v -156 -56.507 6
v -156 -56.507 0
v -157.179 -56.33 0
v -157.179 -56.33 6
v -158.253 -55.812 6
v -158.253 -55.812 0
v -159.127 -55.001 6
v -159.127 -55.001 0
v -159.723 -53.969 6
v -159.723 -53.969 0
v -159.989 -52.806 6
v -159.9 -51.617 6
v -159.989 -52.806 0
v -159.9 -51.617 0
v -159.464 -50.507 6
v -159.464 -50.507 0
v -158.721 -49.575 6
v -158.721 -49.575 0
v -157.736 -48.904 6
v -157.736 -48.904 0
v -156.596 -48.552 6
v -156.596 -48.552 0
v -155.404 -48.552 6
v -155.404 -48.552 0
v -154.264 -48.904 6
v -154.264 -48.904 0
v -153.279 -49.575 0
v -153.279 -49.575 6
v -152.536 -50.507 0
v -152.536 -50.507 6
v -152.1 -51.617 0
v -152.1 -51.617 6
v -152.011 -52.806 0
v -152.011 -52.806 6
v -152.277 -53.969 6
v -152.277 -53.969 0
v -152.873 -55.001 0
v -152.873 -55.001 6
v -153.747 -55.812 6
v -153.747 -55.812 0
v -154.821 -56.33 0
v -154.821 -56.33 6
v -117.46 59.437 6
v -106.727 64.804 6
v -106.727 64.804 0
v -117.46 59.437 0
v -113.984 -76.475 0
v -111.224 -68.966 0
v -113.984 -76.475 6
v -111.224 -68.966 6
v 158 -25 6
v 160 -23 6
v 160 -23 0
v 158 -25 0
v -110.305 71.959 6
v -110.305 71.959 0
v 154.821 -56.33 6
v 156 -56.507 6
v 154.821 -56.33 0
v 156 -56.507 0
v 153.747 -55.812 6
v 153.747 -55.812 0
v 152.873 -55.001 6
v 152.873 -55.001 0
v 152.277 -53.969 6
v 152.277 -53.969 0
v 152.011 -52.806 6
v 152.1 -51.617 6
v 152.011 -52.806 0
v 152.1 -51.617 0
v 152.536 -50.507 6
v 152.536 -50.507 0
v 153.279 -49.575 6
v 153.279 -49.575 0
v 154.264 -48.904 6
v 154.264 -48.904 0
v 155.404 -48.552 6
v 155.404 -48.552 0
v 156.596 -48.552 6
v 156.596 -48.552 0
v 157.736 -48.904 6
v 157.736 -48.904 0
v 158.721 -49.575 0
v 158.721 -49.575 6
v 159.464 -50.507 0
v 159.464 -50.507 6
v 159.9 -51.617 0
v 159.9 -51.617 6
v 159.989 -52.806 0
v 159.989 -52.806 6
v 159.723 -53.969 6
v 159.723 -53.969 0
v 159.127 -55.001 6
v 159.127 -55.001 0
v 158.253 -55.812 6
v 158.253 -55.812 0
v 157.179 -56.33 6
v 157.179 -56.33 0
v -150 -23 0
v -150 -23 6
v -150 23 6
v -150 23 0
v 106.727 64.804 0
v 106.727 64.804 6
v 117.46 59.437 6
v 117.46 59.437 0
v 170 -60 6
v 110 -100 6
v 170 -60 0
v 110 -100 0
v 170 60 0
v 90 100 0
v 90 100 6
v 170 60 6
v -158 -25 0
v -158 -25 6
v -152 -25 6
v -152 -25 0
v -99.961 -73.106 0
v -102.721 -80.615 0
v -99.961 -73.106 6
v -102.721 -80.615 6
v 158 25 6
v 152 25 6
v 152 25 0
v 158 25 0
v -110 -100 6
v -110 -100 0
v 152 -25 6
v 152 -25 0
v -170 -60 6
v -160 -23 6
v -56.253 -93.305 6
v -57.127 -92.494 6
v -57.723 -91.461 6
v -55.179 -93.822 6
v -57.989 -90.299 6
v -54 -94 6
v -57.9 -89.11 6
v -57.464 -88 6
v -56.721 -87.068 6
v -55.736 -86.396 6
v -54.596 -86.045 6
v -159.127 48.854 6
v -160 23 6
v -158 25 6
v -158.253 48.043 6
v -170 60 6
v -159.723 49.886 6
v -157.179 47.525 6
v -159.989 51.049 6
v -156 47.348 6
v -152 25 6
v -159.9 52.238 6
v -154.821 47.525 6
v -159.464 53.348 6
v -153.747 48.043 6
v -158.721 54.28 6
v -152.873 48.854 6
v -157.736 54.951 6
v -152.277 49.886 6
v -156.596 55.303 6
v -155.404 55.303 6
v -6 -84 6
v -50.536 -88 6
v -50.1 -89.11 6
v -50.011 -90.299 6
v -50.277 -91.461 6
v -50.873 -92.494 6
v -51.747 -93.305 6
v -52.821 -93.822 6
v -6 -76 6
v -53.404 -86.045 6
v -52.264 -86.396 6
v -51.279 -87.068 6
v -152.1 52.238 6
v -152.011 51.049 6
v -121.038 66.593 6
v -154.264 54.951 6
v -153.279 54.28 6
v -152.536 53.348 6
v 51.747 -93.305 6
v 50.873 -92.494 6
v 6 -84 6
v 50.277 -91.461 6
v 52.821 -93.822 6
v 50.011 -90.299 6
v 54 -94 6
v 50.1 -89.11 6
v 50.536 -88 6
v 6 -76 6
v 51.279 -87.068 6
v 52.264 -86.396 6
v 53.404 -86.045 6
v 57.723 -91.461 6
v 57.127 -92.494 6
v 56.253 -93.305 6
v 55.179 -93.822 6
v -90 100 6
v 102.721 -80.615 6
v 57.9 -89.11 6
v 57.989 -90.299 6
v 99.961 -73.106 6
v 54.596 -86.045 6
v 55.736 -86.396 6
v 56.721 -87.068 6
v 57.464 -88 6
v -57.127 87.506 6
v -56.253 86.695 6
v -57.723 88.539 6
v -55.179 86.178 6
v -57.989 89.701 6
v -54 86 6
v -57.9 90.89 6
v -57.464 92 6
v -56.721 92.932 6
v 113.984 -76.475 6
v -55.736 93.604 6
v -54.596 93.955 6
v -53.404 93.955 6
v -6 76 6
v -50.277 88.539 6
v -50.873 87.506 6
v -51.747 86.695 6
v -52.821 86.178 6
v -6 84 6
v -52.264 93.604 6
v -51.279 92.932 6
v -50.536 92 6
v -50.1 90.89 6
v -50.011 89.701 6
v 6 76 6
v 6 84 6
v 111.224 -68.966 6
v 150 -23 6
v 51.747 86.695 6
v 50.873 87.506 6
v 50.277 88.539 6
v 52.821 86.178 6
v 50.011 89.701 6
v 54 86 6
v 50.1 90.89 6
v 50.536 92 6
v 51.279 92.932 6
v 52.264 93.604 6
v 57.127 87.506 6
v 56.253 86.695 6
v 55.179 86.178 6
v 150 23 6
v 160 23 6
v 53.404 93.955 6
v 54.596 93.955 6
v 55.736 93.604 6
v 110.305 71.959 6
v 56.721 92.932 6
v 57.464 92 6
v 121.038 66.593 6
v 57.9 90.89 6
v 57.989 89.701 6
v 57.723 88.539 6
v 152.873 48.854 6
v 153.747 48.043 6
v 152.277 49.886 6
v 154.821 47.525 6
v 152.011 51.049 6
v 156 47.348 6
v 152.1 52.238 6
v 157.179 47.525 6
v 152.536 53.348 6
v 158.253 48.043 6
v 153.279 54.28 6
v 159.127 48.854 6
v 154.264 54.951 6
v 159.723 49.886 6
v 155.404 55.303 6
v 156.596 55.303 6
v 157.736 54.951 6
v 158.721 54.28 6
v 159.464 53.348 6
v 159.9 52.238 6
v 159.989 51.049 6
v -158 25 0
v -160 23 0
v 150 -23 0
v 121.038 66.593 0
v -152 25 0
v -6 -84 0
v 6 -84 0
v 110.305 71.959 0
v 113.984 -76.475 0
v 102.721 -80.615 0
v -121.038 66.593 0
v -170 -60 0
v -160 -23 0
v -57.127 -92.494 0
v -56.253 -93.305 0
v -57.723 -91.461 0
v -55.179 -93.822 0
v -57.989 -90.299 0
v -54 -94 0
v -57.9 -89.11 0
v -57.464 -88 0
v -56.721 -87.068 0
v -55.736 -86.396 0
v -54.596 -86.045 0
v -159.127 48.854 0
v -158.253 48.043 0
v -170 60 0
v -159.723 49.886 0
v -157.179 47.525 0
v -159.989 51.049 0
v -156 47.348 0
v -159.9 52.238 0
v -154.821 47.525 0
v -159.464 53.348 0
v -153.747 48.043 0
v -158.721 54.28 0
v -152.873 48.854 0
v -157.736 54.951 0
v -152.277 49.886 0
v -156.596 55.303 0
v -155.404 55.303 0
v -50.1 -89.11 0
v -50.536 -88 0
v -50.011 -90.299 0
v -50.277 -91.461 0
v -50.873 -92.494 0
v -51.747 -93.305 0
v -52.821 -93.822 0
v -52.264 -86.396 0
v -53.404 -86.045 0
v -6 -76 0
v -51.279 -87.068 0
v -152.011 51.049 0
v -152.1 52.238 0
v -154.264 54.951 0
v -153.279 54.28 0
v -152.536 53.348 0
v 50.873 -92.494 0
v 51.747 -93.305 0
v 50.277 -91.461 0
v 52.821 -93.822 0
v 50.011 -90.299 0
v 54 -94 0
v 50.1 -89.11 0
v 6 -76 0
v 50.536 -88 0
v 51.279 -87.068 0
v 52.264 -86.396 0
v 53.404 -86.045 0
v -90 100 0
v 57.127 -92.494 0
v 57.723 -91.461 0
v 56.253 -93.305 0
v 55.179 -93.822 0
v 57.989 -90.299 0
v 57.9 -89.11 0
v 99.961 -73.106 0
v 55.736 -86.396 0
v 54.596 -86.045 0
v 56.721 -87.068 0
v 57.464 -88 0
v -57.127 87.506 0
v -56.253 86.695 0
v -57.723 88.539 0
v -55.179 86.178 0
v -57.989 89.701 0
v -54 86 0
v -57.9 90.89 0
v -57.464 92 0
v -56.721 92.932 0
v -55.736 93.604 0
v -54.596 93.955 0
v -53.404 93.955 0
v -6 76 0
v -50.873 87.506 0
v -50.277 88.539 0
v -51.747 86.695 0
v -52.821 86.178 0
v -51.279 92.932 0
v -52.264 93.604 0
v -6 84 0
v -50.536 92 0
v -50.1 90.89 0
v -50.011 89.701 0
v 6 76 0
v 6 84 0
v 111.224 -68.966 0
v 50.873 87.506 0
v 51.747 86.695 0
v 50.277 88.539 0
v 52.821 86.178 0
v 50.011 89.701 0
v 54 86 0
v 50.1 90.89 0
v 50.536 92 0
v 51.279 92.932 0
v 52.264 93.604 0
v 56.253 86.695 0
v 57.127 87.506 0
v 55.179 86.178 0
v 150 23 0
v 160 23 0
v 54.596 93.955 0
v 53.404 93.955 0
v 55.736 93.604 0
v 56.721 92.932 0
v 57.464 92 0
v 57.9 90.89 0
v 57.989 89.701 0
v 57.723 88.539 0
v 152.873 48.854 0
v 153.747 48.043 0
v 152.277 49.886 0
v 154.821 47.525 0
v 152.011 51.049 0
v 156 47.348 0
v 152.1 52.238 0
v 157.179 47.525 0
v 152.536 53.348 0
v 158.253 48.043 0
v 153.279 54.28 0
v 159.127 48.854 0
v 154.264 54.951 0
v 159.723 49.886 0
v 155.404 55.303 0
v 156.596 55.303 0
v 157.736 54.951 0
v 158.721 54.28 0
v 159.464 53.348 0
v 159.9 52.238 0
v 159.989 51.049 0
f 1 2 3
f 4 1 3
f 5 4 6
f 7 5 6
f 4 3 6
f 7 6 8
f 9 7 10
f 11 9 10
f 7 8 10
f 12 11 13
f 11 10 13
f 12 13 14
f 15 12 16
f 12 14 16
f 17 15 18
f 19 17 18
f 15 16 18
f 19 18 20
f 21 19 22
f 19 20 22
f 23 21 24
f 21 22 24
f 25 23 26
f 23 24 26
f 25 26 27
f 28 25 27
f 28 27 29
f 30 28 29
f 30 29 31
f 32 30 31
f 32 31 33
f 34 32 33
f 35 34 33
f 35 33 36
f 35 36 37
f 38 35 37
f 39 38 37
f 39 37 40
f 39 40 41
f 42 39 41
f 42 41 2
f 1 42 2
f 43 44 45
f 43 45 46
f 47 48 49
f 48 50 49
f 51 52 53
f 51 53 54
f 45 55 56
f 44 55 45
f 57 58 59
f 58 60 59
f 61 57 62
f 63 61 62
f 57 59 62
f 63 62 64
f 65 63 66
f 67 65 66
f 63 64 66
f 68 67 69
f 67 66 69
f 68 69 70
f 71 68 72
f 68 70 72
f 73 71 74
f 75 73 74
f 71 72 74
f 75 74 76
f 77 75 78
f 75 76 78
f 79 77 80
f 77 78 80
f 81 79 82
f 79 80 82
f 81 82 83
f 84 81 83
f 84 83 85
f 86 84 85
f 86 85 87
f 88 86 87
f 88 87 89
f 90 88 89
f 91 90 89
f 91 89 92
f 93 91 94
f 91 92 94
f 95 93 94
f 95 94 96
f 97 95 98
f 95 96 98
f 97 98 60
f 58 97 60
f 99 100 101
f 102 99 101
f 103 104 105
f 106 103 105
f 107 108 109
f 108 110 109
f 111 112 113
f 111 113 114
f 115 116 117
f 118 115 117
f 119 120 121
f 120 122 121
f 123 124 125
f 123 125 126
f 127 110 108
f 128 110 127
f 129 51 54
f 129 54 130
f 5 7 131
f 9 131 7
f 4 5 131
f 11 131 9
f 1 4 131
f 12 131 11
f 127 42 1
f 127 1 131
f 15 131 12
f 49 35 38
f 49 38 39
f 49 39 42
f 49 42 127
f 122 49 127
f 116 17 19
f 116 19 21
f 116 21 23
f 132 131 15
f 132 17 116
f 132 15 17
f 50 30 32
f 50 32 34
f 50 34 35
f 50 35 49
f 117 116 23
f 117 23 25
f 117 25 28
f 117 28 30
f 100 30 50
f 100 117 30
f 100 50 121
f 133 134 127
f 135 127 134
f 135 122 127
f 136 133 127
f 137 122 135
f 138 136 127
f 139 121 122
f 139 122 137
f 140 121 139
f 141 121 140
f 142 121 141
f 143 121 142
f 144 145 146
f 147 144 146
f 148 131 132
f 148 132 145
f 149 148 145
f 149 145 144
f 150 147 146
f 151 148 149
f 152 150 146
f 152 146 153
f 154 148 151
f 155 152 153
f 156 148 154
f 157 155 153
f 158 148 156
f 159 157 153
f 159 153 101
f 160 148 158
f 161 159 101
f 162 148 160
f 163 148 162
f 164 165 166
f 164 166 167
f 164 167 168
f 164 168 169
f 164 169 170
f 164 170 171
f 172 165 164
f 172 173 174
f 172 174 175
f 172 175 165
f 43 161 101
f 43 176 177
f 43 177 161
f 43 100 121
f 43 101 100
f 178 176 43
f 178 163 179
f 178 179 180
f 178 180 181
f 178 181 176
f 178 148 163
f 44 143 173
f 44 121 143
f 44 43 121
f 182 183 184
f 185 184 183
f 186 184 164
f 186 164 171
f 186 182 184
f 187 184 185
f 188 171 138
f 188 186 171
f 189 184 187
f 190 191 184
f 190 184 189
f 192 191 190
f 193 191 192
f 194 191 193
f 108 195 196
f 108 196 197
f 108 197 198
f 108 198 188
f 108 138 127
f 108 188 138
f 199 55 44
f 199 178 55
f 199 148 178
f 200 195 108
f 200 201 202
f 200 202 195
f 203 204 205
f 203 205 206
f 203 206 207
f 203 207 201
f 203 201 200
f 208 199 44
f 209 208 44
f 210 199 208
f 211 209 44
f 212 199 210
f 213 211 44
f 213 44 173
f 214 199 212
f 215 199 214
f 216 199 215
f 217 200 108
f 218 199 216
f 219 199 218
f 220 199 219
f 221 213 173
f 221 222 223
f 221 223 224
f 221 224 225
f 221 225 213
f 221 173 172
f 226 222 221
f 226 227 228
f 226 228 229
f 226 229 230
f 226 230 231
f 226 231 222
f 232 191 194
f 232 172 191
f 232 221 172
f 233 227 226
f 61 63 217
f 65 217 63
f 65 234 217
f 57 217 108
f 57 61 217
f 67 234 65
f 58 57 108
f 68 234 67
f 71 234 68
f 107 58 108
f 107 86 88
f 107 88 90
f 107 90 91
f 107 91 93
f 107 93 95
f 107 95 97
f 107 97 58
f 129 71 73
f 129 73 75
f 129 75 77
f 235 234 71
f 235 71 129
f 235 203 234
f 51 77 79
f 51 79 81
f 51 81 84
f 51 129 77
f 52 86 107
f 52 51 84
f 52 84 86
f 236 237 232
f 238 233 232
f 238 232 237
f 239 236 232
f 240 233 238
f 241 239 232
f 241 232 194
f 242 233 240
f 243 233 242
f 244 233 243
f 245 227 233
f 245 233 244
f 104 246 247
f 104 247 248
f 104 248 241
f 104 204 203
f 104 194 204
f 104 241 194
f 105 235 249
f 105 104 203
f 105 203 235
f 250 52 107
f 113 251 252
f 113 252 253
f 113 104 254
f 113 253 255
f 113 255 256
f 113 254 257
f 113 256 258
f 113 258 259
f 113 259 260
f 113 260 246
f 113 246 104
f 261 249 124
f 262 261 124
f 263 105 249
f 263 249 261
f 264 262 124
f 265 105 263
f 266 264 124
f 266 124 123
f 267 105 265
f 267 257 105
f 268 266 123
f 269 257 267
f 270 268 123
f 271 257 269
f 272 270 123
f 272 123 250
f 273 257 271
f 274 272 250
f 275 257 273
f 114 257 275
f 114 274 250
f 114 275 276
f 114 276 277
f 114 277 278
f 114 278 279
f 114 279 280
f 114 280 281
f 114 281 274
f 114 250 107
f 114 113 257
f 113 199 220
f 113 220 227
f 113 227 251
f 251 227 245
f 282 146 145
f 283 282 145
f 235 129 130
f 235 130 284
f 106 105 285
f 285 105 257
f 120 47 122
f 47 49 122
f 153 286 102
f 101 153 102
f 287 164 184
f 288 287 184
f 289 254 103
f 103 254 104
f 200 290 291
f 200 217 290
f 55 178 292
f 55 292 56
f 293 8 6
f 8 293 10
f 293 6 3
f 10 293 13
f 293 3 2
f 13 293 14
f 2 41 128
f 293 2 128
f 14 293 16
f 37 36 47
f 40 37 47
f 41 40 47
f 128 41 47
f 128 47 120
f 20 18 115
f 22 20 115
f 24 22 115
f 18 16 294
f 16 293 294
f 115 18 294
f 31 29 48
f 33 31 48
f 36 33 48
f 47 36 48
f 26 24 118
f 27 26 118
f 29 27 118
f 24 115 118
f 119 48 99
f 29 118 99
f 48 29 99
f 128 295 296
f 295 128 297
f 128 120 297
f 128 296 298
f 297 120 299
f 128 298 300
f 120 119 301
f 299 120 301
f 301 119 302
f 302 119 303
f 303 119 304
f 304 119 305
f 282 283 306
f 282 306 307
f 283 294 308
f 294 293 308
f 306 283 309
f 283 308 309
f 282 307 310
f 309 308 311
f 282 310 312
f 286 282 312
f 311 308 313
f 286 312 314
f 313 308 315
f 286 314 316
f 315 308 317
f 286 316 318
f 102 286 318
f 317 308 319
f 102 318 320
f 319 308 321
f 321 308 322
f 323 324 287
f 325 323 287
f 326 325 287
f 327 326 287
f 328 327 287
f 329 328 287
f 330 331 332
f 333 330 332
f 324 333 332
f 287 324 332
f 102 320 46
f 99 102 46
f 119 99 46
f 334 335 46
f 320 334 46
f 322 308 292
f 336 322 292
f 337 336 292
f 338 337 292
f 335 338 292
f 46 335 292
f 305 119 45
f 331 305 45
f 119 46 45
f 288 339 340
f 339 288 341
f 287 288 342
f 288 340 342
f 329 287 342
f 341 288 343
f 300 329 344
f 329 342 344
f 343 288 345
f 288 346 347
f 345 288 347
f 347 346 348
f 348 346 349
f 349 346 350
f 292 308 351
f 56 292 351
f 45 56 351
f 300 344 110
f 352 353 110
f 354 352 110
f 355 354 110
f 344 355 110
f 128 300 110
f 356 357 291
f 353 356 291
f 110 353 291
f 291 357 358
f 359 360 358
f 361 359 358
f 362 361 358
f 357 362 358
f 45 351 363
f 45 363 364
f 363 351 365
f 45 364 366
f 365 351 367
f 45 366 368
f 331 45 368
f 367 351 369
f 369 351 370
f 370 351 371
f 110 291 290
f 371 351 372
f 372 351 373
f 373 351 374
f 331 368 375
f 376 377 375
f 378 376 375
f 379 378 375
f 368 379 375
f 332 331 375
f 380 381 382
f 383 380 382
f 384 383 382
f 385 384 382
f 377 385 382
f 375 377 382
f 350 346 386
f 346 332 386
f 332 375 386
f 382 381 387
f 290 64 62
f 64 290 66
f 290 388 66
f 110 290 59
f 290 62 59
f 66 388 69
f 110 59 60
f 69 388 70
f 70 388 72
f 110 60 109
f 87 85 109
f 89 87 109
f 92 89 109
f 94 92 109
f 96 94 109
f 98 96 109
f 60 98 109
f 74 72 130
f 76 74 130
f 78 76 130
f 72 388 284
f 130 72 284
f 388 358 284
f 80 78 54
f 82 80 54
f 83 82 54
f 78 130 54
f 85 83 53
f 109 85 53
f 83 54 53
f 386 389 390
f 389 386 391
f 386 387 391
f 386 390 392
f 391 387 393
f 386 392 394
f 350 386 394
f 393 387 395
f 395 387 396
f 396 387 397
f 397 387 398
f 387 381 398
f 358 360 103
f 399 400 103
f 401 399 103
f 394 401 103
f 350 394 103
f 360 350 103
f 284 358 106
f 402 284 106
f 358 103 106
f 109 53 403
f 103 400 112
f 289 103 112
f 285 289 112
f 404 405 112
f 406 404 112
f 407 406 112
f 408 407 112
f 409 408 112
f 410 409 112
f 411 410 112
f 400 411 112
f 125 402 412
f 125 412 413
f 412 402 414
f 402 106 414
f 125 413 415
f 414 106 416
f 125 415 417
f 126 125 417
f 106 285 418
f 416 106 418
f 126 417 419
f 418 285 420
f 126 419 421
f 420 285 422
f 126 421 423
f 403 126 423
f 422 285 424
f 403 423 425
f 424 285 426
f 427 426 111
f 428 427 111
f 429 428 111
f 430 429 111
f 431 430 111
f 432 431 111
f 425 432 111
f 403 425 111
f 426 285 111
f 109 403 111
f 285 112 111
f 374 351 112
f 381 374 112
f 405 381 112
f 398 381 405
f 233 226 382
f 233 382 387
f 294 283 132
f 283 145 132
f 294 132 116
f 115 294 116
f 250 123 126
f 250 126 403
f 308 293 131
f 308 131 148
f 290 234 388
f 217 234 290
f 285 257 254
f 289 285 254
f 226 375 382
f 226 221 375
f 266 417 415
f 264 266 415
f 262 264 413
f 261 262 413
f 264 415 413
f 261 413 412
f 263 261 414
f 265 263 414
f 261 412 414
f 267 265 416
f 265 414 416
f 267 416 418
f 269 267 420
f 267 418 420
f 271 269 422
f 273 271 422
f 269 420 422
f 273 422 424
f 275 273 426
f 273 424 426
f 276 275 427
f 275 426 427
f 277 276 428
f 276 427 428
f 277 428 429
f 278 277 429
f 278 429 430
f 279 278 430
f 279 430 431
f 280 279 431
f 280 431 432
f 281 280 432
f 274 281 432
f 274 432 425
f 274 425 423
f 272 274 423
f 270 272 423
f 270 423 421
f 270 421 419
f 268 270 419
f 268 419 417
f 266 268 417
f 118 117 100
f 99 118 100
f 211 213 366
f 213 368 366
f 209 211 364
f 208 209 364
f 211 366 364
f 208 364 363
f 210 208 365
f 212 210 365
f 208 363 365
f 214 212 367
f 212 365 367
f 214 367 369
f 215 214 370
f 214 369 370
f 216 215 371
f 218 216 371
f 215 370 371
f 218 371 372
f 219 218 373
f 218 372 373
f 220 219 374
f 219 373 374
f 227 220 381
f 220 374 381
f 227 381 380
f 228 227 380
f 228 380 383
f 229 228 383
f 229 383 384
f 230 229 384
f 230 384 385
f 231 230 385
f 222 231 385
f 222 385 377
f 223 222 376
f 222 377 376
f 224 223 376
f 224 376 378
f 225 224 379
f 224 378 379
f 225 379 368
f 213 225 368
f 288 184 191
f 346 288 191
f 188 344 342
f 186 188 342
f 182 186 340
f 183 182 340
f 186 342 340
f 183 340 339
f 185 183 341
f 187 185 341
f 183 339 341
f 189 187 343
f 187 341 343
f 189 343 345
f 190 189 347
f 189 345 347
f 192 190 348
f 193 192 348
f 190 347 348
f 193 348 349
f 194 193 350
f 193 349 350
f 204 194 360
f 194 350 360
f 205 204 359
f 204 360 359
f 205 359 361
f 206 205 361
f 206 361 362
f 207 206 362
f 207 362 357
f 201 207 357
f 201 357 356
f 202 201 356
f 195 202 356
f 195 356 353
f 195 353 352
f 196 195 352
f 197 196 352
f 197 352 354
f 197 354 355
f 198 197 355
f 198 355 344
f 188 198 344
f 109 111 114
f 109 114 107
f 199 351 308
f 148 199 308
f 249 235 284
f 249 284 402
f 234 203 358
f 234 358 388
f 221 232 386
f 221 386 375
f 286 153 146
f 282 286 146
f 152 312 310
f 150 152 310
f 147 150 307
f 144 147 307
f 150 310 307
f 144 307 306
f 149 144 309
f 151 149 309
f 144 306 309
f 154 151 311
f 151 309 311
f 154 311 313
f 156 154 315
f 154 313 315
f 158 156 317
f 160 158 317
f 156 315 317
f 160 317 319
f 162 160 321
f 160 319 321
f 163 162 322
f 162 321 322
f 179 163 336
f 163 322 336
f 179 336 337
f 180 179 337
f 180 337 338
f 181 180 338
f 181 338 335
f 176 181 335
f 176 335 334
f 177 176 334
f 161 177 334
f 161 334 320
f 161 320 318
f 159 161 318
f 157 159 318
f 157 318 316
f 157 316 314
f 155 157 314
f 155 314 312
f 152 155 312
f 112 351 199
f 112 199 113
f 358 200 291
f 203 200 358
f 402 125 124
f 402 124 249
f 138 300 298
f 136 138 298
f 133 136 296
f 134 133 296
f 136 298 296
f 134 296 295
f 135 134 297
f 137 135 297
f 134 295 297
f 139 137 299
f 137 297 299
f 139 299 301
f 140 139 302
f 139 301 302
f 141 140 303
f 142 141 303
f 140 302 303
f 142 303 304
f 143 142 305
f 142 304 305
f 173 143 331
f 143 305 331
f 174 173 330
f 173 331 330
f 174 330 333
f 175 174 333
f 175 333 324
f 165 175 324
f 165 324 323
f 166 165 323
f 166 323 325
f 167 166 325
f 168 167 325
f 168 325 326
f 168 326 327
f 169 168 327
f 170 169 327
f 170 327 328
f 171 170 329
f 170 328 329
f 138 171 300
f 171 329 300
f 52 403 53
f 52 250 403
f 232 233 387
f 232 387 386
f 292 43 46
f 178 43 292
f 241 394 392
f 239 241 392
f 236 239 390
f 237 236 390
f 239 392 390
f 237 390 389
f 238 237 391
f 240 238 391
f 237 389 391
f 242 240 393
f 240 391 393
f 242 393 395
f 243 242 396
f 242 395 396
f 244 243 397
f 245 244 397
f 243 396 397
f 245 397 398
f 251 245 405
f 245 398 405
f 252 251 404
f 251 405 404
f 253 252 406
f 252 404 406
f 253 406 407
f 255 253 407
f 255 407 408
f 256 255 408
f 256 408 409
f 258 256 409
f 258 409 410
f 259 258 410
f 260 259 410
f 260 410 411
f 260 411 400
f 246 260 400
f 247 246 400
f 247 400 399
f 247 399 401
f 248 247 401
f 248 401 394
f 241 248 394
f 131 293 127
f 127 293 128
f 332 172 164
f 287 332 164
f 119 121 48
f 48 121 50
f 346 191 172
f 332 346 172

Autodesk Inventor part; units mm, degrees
ref_plane "YZ Plane" through (0, 0, 0) normal (1, 0, 0) x (0, 1, 0)
ref_plane "XZ Plane" through (0, 0, 0) normal (0, 1, 0) x (-1, 0, 0)
ref_plane "XY Plane" through (0, 0, 0) normal (0, 0, 1) x (1, 0, 0)
sketch "Esquisse1" plane through (0, 0, 0) normal (0, 0, 1) x (1, 0, 0)
  line L0 (110, -100) -> (-110, -100)
  line L1 (-170, -60) -> (-170, 60)
  line L2 (170, 60) -> (170, -60)
  line L3 (170, -100) -> (-170, 100) construction
  line L4 (-170, -100) -> (170, 100) construction
  line L5 (-90, 100) -> (-170, 60)
  line L6 (90, 100) -> (170, 60)
  line L7 (-170, -60) -> (-110, -100)
  line L8 (110, -100) -> (170, -60)
  line L9 (-90, 100) -> (90, 100)
  point P0 (0, 0)
  point P1 (0, 0)
  dimension "d0" = 340
  dimension "d1" = 80
  dimension "d2" = 40
  dimension "d3" = 80
  dimension "d4" = 40
  dimension "d5" = 40
  dimension "d6" = 60
  dimension "d7" = 60
  dimension "d8" = 40
  dimension "d17" = 100
extrude "Extrusion1" add sketch "Esquisse1" along normal blind 6
sketch "Esquisse2" plane through (0, 0, 6) normal (0, 0, 1) x (1, 0, 0)
  line L0 (-54, 90) -> (54, 90)
  line L1 (-156, 0) -> (156, 0)
  line L2 (-170, 60) -> (-170, -60)
  line L3 (170, -60) -> (170, 60)
  line L4 (-110, -100) -> (110, -100)
  line L5 (90, 100) -> (-69, 100)
  line L6 (-156, 0) -> (-156, 51.3475)
  line L7 (-156, 0) -> (-156, -52.5074)
  line L8 (156, 0) -> (156, 51.3475)
  line L9 (156, 0) -> (156, -52.5074)
  line L10 (170, 60) -> (90, 100) projected
  line L11 (110, -100) -> (170, -60) projected
  line L12 (-170, -60) -> (-110, -100) projected
  line L13 (-90, 100) -> (-170, 60) projected
  line L14 (90, 100) -> (-90, 100) projected
  point P0 (0, 0)
  point P1 (0, 0)
  point P2 (-54, -90)
  point P3 (54, -90)
  point P4 (0, 0)
  dimension "d21" = 14
  dimension "d22" = 14
  dimension "d23" = 10
  dimension "d24" = 108
  dimension "d25" = 54
  dimension "d29" = 108
  dimension "d30" = 10
  dimension "d31" = 10
  dimension "d32" = 56
  dimension "d34" = 56
  dimension "d42" = 14
  dimension "d43" = 14
  dimension "d44" = 14
  dimension "d45" = 14
hole "Perçage1" at (-156, -52.5074, 6) at (-156, 51.3475, 6) at (-54, 90, 6) at (54, 90, 6) at (156, 51.3475, 6) at (156, -52.5074, 6) at (54, -90, 6) at (-54, -90, 6) direction (0, 0, -1) diameter 8 end through all
sketch "Esquisse3" plane through (0, 0, 6) normal (0, 0, 1) x (1, 0, 0)
  line L0 (-6, 84) -> (6, 84)
  line L1 (6, 84) -> (6, 76)
  line L2 (6, 76) -> (-6, 76)
  line L3 (-6, 76) -> (-6, 84)
  line L4 (-121.0377, 66.5926) -> (-110.3046, 71.9592)
  line L5 (-110.3046, 71.9592) -> (-106.7269, 64.8037)
  line L6 (-106.7269, 64.8037) -> (-117.46, 59.4372)
  line L7 (-117.46, 59.4372) -> (-121.0377, 66.5926)
  line L8 (-113.9841, -76.4747) -> (-102.7209, -80.6148)
  line L9 (-102.7209, -80.6148) -> (-99.9608, -73.106)
  line L10 (-99.9608, -73.106) -> (-111.2241, -68.9659)
  line L11 (-111.2241, -68.9659) -> (-113.9841, -76.4747)
  line L12 (-90, 100) -> (-170, 60) projected
  circle A0 centre (-156, 51.3475) radius 4 projected
  circle A1 centre (-156, -52.5074) radius 4 projected
  circle A2 centre (-54, -90) radius 4 projected
  line L13 (-156, -52.5074) -> (-54, -90)
  line L14 (0, 0) -> (0, -39.4059)
  line L15 (0, 0) -> (52.1624, 0)
  line L16 (121.0377, 66.5926) -> (110.3046, 71.9592)
  line L17 (110.3046, 71.9592) -> (106.7269, 64.8037)
  line L18 (106.7269, 64.8037) -> (117.46, 59.4372)
  line L19 (117.46, 59.4372) -> (121.0377, 66.5926)
  line L20 (113.9841, -76.4747) -> (102.7209, -80.6148)
  line L21 (102.7209, -80.6148) -> (99.9608, -73.106)
  line L22 (99.9608, -73.106) -> (111.2241, -68.9659)
  line L23 (111.2241, -68.9659) -> (113.9841, -76.4747)
  line L24 (156, -52.5074) -> (54, -90)
  line L25 (90, 100) -> (-90, 100) projected
  line L26 (-6, -84) -> (6, -84)
  line L27 (6, -84) -> (6, -76)
  line L28 (6, -76) -> (-6, -76)
  line L29 (-6, -76) -> (-6, -84)
  dimension "d46" = 16
  dimension "d47" = 24
  dimension "d48" = 12
  dimension "d49" = 38.089
  dimension "d52" = 8
  dimension "d53" = 12
  dimension "d54" = 47.705
  dimension "d55" = 12
  dimension "d56" = 8
  dimension "d57" = 6
  dimension "d58" = 16
extrude "Extrusion2" cut sketch "Esquisse3" against normal blind 10 contours L0 L1 L2 L3 | L4 L5 L6 L7 | L11 L10 L9 L8 | L19 L18 L17 L16 | L20 L21 L22 L23 | L29 L28 L27 L26
sketch "Esquisse4" plane through (0, 0, 6) normal (0, 0, 1) x (1, 0, 0)
  line L0 (0, 0) -> (0, 42.3404)
  line L1 (-152, 25) -> (-158, 25)
  line L2 (-160, 23) -> (-160, -23)
  line L3 (-158, -25) -> (-152, -25)
  line L4 (-150, -23) -> (-150, 23)
  line L5 (-158, 25) -> (-160, 23)
  line L6 (-152, 25) -> (-150, 23)
  line L7 (-152, -25) -> (-150, -23)
  line L8 (-160, -23) -> (-158, -25)
  line L9 (152, 25) -> (158, 25)
  line L10 (160, 23) -> (160, -23)
  line L11 (158, -25) -> (152, -25)
  line L12 (150, -23) -> (150, 23)
  line L13 (158, 25) -> (160, 23)
  line L14 (152, 25) -> (150, 23)
  line L15 (152, -25) -> (150, -23)
  line L16 (160, -23) -> (158, -25)
  point P0 (-150, 25)
  point P1 (-160, -25)
  point P2 (-160, 25)
  point P3 (-150, -25)
  point P4 (150, 25)
  point P5 (160, -25)
  point P6 (160, 25)
  point P7 (150, -25)
  dimension "d59" = 10
  dimension "d60" = 150
  dimension "d61" = 50
  dimension "d62" = 25
  dimension "d63" = 2
  dimension "d64" = 2
  dimension "d65" = 2
  dimension "d66" = 2
  dimension "d67" = 2
  dimension "d68" = 2
  dimension "d69" = 2
  dimension "d70" = 2
extrude "Extrusion3" cut sketch "Esquisse4" against normal blind 10
equation "\"d64\" = d63"
equation "\"d65\" = d63"
equation "\"d66\" = d65"
equation "\"d67\" = d63"
equation "\"d68\" = d67"
equation "\"d69\" = d63"
equation "\"d70\" = d69"
properties part number "Support_Carte"
